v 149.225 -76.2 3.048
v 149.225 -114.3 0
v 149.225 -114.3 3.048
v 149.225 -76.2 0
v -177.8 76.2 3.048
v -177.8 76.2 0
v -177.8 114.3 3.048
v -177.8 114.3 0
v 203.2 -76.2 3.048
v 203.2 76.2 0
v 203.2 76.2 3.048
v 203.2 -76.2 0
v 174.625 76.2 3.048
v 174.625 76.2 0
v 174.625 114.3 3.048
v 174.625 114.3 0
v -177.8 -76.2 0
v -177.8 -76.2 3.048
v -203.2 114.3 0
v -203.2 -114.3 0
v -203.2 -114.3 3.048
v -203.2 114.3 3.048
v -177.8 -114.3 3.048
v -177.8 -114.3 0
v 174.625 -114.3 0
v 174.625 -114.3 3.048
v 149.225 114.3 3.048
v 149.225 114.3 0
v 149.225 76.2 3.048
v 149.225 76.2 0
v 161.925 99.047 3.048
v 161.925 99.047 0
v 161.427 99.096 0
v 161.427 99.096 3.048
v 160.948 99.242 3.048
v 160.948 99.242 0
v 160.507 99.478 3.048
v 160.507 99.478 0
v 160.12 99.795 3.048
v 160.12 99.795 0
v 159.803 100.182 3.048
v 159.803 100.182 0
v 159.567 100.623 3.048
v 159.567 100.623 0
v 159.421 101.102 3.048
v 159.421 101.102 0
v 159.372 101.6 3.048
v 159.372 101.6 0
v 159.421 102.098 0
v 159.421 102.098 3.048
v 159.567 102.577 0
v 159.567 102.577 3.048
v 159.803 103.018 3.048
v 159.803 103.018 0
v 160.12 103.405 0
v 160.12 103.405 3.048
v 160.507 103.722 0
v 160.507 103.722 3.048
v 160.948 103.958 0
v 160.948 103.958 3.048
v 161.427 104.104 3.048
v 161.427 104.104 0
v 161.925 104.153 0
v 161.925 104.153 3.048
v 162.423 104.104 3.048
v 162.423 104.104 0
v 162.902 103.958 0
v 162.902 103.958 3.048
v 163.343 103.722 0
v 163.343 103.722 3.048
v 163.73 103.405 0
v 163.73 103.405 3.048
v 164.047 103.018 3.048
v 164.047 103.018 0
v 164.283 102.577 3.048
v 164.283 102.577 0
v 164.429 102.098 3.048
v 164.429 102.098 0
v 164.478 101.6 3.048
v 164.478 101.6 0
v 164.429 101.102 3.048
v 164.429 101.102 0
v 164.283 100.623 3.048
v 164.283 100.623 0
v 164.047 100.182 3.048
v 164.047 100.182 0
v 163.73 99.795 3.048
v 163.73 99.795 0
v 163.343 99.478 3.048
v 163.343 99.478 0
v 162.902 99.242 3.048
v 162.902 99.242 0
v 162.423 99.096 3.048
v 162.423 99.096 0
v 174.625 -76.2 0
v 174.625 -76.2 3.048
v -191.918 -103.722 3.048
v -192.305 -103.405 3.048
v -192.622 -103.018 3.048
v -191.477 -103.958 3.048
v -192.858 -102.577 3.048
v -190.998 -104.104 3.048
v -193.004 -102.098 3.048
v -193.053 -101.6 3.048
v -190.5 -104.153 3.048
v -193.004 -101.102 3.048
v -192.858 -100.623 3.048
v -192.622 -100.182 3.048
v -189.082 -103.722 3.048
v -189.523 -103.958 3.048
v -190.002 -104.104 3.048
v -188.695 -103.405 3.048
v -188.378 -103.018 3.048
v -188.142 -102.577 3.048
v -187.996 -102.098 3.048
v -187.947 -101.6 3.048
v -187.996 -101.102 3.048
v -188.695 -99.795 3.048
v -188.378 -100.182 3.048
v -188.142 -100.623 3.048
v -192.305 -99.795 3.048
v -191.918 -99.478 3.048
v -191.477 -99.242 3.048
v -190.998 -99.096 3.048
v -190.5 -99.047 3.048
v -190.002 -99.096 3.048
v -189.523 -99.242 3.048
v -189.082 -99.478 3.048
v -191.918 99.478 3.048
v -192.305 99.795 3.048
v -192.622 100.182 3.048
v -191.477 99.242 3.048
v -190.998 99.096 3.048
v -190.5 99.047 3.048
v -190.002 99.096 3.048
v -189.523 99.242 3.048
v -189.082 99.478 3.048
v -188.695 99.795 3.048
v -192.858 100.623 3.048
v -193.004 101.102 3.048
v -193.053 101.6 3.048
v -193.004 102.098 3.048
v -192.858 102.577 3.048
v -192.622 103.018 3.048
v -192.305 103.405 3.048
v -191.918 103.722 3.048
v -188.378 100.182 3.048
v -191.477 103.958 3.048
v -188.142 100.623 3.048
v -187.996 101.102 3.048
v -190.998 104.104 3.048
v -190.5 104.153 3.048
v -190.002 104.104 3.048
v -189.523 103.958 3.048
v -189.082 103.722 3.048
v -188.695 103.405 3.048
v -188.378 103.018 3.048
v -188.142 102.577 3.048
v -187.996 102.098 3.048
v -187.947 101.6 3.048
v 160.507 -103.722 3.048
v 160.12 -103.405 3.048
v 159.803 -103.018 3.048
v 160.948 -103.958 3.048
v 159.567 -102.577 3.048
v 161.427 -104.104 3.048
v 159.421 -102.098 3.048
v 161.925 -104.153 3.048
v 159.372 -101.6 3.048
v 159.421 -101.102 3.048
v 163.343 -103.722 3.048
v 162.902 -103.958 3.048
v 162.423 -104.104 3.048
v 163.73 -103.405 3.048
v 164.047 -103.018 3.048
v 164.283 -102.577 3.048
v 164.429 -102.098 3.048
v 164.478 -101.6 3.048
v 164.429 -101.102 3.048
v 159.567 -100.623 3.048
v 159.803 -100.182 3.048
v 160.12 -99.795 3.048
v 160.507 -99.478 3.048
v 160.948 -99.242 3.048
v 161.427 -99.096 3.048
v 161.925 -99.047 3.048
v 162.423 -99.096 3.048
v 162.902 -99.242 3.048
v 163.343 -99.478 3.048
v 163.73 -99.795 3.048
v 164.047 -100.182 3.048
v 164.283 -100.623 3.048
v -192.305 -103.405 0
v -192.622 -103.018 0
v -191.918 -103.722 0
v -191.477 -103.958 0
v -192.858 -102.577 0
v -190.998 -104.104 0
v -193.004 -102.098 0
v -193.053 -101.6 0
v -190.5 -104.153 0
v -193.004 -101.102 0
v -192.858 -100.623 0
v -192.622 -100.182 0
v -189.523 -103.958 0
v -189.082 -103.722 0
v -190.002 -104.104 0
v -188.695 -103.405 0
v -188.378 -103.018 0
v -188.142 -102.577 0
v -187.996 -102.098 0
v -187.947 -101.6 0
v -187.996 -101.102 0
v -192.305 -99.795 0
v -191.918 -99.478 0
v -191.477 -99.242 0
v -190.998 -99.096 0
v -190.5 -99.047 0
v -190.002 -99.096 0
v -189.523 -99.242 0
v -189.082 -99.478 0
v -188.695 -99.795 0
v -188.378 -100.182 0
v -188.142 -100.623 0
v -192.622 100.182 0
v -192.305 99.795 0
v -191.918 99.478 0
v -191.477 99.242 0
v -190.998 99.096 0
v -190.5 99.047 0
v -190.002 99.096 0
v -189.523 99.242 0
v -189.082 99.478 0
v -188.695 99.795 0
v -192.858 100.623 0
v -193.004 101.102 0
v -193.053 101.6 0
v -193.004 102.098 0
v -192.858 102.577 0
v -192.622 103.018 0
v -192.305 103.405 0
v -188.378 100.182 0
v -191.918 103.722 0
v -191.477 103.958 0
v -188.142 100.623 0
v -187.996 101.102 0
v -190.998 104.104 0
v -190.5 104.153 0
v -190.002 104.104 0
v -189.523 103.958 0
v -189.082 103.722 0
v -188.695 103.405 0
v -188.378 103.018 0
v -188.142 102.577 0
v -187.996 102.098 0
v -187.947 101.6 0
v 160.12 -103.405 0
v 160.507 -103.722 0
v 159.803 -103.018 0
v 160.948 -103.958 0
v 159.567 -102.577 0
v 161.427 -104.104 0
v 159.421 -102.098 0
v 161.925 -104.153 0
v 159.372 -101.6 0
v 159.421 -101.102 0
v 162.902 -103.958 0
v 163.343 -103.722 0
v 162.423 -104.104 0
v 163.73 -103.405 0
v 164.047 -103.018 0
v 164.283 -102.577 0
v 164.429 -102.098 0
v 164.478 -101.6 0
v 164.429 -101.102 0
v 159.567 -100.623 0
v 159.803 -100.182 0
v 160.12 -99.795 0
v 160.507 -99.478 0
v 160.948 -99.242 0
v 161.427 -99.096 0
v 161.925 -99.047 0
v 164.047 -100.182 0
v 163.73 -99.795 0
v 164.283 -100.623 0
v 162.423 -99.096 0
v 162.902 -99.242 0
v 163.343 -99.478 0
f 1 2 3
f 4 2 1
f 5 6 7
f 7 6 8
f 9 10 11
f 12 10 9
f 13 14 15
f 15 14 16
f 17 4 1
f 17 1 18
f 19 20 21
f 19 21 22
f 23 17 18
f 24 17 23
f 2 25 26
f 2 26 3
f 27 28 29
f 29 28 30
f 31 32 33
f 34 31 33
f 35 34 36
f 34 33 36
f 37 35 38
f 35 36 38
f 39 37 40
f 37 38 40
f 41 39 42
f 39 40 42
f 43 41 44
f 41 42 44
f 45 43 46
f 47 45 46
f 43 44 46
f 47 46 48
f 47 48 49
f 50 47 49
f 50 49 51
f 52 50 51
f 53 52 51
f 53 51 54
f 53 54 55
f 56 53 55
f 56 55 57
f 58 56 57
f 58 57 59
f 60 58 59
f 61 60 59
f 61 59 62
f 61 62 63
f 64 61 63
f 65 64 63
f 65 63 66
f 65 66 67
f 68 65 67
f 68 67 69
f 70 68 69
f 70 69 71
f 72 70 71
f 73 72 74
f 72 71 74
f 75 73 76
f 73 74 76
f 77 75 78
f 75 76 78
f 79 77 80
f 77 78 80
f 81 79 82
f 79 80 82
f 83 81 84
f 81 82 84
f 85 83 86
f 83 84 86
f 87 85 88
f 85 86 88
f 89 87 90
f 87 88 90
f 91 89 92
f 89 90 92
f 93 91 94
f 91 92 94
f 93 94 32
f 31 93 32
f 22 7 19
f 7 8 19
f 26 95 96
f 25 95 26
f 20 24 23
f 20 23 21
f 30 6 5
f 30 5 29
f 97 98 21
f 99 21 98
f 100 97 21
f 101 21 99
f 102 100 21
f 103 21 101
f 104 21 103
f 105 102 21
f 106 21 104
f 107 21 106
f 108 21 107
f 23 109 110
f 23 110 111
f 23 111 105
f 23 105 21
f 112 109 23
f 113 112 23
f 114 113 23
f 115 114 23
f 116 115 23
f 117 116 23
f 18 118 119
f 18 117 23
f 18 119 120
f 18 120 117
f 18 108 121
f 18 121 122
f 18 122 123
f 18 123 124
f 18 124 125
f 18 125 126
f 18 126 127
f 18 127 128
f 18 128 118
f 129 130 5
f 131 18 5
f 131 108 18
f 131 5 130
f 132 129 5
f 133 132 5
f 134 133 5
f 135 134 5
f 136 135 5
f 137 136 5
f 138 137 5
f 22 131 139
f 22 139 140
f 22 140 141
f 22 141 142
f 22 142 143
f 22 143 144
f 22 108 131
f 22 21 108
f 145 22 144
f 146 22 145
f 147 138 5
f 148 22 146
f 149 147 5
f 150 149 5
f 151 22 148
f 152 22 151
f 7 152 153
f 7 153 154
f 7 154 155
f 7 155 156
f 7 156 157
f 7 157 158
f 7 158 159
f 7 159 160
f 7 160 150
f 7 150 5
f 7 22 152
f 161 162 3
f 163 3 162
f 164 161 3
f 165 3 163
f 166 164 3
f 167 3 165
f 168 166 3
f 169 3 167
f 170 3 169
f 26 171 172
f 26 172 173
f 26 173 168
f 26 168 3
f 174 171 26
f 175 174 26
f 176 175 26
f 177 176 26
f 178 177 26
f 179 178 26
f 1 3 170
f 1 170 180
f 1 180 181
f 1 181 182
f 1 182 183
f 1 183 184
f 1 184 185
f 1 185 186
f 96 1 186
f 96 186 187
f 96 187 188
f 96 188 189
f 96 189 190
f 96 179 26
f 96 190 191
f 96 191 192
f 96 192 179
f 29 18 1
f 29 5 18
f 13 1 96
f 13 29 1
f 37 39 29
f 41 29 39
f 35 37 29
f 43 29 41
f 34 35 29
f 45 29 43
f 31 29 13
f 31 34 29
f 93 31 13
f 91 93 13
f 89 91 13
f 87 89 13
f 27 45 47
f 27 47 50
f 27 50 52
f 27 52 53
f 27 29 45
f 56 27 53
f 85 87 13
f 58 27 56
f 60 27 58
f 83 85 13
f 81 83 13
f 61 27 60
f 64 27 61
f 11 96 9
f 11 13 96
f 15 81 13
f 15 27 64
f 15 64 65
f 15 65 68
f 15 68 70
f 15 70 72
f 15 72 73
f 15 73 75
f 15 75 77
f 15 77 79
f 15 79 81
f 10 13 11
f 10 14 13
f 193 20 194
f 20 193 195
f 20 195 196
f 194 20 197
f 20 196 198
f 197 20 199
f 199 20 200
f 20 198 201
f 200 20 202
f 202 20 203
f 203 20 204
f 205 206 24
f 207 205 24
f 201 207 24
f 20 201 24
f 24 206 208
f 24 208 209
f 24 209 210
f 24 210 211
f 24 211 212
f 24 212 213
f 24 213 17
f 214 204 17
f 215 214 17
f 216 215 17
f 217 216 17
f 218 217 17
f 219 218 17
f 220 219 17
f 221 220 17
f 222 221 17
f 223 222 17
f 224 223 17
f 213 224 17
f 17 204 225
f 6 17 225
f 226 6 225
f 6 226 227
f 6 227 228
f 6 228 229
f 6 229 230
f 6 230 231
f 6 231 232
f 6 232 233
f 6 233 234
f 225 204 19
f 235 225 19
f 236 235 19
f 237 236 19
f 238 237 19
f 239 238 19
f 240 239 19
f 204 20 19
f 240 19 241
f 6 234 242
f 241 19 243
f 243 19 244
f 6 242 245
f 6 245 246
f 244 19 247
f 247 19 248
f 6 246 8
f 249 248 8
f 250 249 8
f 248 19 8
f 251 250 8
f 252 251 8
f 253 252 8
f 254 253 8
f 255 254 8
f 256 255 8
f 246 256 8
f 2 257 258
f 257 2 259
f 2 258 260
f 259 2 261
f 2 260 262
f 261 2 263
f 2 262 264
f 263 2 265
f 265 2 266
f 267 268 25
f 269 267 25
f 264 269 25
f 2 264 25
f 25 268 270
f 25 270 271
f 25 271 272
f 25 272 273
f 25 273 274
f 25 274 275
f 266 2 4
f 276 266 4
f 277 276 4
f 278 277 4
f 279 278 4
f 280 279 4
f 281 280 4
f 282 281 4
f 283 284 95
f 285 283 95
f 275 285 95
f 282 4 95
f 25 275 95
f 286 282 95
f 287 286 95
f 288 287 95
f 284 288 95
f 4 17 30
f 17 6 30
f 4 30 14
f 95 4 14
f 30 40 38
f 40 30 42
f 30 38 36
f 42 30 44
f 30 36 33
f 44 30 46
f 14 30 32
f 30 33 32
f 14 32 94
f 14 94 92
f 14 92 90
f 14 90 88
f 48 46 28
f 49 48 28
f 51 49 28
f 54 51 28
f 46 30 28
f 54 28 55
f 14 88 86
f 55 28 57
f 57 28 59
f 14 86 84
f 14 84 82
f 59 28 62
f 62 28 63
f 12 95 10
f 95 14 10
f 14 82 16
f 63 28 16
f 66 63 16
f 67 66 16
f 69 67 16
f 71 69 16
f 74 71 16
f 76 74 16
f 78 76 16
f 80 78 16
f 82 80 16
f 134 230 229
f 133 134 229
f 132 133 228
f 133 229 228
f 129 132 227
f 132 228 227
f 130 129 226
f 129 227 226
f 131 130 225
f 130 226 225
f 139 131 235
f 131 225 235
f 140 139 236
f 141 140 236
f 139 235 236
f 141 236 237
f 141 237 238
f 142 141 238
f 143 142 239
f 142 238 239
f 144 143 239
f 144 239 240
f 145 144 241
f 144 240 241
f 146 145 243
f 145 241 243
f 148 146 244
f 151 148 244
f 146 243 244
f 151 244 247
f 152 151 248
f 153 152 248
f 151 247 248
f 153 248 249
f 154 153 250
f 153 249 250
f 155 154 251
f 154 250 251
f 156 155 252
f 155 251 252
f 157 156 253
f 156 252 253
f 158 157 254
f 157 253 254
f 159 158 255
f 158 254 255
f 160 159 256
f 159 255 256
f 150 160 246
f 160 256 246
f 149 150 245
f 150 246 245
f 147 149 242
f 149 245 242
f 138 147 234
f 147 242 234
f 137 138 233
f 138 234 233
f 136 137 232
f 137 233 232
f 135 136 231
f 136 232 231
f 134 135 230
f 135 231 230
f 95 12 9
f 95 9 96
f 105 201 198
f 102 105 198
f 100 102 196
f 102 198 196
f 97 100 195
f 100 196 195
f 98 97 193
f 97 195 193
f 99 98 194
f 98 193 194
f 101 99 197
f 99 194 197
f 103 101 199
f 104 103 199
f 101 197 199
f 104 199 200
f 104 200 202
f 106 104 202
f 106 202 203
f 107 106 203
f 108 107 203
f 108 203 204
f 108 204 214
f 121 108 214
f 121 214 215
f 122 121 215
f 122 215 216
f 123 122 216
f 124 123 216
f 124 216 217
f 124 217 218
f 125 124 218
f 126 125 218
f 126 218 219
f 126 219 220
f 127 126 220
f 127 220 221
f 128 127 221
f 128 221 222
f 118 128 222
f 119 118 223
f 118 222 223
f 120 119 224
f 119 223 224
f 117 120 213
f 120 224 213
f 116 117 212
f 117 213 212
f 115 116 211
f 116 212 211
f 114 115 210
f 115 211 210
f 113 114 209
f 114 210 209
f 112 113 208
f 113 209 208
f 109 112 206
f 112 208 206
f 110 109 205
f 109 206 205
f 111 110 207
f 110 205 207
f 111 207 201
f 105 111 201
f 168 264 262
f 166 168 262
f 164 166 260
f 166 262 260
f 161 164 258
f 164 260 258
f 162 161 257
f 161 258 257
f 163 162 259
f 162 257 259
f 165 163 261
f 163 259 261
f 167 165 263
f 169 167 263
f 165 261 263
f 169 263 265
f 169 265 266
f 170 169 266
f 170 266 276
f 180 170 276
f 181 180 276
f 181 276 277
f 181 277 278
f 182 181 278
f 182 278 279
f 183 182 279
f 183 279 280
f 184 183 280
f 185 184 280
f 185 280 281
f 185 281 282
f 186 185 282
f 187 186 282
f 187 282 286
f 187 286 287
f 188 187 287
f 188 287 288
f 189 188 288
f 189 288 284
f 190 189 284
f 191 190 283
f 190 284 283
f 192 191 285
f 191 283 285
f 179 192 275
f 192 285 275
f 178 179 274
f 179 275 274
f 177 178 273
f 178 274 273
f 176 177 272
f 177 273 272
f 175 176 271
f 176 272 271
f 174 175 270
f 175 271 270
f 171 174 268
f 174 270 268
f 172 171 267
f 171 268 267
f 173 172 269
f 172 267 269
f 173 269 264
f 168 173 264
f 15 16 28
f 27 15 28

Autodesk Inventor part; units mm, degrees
ref_plane "YZ Plane" through (0, 0, 0) normal (1, 0, 0) x (0, 1, 0)
ref_plane "XZ Plane" through (0, 0, 0) normal (0, 1, 0) x (-1, 0, 0)
ref_plane "XY Plane" through (0, 0, 0) normal (0, 0, 1) x (1, 0, 0)
sketch "Sketch1" plane through (0, 0, 0) normal (0, 0, 1) x (1, 0, 0)
  line L0 (203.2, -76.2) -> (-203.2, -76.2)
  line L1 (-203.2, -76.2) -> (-203.2, 76.2)
  line L2 (-203.2, 76.2) -> (203.2, 76.2)
  line L3 (203.2, 76.2) -> (203.2, -76.2)
  line L4 (203.2, -76.2) -> (-203.2, 76.2) construction
  line L5 (-203.2, -76.2) -> (203.2, 76.2) construction
  line L6 (149.225, -76.2) -> (174.625, -76.2)
  line L7 (174.625, -76.2) -> (174.625, -114.3)
  line L8 (174.625, -114.3) -> (149.225, -114.3)
  line L9 (149.225, -114.3) -> (149.225, -76.2)
  line L10 (0, 0) -> (203.2, 0) construction
  line L11 (174.625, 76.2) -> (174.625, 114.3)
  line L12 (174.625, 114.3) -> (149.225, 114.3)
  line L13 (149.225, 114.3) -> (149.225, 76.2)
  line L14 (-203.2, -76.2) -> (-177.8, -76.2)
  line L15 (-177.8, -76.2) -> (-177.8, -114.3)
  line L16 (-177.8, -114.3) -> (-203.2, -114.3)
  line L17 (-203.2, -114.3) -> (-203.2, -76.2)
  line L18 (149.225, -114.3) -> (149.225, -76.2)
  line L19 (-177.8, 76.2) -> (-177.8, 114.3)
  line L20 (-177.8, 114.3) -> (-203.2, 114.3)
  line L21 (-203.2, 114.3) -> (-203.2, 76.2)
  dimension "d0" = 406.4
  dimension "d1" = 152.4
  dimension "d2" = 25.4
  dimension "d3" = 38.1
  dimension "d4" = 28.575
  dimension "d6" = 25.4
  dimension "d7" = 38.1
extrude "Plate1" add sketch "Sketch1" along normal blind 3.048
sketch "Sketch2" plane through (0, 0, 3.048) normal (0, 0, 1) x (1, 0, 0)
  line L0 (-203.2, -114.3) -> (-203.2, 114.3) construction
  line L1 (-177.8, -114.3) -> (-203.2, -114.3) construction
  line L2 (-177.8, -76.2) -> (-177.8, -114.3) construction
  line L3 (149.225, -76.2) -> (-177.8, -76.2) construction
  line L4 (149.225, -114.3) -> (149.225, -76.2) construction
  line L5 (174.625, -114.3) -> (149.225, -114.3) construction
  line L6 (174.625, -76.2) -> (174.625, -114.3) construction
  line L7 (203.2, -76.2) -> (174.625, -76.2) construction
  line L8 (203.2, 76.2) -> (203.2, -76.2) construction
  line L9 (174.625, 76.2) -> (203.2, 76.2) construction
  line L10 (174.625, 114.3) -> (174.625, 76.2) construction
  line L11 (149.225, 114.3) -> (174.625, 114.3) construction
  line L12 (149.225, 76.2) -> (149.225, 114.3) construction
  line L13 (-177.8, 76.2) -> (149.225, 76.2) construction
  line L14 (-177.8, 114.3) -> (-177.8, 76.2) construction
  line L15 (-203.2, 114.3) -> (-177.8, 114.3) construction
  point P0 (0, 0)
  point P1 (-190.5, 101.6)
  point P2 (161.925, 101.6)
  point P3 (-190.5, -101.6)
  point P4 (161.925, -101.6)
  dimension "d8" = 12.7
  dimension "d9" = 12.7
  dimension "d12" = 352.425
  dimension "d15" = 203.2
hole "Hole1" at (-190.5, 101.6, 3.048) at (161.925, 101.6, 3.048) at (-190.5, -101.6, 3.048) at (161.925, -101.6, 3.048) direction (0, 0, -1) diameter 5.1054 end through all clearance for "Flat Head Machine Screw (82)" size "#10" standard "Ansi Unified Screw Threads"
equation "\"d23\" = Thickness"
equation "\"d5\" = Thickness"
equation "\"BendRadius\" = Thickness"
equation "\"BendReliefWidth\" = Thickness"
equation "\"BendReliefDepth\" = 0.5 * Thickness"
equation "\"CornerReliefSize\" = 4 * Thickness"
equation "\"MinimumRemnant\" = 2 * Thickness"
equation "\"TransitionRadius\" = BendRadius"
equation "\"JacobiRadiusSize\" = BendRadius"
equation "\"GapSize\" = Thickness"
equation "\"Thickness\" = 3.048"
properties part number "feeder_slide_plate" material "Polycarbonate, Clear"
